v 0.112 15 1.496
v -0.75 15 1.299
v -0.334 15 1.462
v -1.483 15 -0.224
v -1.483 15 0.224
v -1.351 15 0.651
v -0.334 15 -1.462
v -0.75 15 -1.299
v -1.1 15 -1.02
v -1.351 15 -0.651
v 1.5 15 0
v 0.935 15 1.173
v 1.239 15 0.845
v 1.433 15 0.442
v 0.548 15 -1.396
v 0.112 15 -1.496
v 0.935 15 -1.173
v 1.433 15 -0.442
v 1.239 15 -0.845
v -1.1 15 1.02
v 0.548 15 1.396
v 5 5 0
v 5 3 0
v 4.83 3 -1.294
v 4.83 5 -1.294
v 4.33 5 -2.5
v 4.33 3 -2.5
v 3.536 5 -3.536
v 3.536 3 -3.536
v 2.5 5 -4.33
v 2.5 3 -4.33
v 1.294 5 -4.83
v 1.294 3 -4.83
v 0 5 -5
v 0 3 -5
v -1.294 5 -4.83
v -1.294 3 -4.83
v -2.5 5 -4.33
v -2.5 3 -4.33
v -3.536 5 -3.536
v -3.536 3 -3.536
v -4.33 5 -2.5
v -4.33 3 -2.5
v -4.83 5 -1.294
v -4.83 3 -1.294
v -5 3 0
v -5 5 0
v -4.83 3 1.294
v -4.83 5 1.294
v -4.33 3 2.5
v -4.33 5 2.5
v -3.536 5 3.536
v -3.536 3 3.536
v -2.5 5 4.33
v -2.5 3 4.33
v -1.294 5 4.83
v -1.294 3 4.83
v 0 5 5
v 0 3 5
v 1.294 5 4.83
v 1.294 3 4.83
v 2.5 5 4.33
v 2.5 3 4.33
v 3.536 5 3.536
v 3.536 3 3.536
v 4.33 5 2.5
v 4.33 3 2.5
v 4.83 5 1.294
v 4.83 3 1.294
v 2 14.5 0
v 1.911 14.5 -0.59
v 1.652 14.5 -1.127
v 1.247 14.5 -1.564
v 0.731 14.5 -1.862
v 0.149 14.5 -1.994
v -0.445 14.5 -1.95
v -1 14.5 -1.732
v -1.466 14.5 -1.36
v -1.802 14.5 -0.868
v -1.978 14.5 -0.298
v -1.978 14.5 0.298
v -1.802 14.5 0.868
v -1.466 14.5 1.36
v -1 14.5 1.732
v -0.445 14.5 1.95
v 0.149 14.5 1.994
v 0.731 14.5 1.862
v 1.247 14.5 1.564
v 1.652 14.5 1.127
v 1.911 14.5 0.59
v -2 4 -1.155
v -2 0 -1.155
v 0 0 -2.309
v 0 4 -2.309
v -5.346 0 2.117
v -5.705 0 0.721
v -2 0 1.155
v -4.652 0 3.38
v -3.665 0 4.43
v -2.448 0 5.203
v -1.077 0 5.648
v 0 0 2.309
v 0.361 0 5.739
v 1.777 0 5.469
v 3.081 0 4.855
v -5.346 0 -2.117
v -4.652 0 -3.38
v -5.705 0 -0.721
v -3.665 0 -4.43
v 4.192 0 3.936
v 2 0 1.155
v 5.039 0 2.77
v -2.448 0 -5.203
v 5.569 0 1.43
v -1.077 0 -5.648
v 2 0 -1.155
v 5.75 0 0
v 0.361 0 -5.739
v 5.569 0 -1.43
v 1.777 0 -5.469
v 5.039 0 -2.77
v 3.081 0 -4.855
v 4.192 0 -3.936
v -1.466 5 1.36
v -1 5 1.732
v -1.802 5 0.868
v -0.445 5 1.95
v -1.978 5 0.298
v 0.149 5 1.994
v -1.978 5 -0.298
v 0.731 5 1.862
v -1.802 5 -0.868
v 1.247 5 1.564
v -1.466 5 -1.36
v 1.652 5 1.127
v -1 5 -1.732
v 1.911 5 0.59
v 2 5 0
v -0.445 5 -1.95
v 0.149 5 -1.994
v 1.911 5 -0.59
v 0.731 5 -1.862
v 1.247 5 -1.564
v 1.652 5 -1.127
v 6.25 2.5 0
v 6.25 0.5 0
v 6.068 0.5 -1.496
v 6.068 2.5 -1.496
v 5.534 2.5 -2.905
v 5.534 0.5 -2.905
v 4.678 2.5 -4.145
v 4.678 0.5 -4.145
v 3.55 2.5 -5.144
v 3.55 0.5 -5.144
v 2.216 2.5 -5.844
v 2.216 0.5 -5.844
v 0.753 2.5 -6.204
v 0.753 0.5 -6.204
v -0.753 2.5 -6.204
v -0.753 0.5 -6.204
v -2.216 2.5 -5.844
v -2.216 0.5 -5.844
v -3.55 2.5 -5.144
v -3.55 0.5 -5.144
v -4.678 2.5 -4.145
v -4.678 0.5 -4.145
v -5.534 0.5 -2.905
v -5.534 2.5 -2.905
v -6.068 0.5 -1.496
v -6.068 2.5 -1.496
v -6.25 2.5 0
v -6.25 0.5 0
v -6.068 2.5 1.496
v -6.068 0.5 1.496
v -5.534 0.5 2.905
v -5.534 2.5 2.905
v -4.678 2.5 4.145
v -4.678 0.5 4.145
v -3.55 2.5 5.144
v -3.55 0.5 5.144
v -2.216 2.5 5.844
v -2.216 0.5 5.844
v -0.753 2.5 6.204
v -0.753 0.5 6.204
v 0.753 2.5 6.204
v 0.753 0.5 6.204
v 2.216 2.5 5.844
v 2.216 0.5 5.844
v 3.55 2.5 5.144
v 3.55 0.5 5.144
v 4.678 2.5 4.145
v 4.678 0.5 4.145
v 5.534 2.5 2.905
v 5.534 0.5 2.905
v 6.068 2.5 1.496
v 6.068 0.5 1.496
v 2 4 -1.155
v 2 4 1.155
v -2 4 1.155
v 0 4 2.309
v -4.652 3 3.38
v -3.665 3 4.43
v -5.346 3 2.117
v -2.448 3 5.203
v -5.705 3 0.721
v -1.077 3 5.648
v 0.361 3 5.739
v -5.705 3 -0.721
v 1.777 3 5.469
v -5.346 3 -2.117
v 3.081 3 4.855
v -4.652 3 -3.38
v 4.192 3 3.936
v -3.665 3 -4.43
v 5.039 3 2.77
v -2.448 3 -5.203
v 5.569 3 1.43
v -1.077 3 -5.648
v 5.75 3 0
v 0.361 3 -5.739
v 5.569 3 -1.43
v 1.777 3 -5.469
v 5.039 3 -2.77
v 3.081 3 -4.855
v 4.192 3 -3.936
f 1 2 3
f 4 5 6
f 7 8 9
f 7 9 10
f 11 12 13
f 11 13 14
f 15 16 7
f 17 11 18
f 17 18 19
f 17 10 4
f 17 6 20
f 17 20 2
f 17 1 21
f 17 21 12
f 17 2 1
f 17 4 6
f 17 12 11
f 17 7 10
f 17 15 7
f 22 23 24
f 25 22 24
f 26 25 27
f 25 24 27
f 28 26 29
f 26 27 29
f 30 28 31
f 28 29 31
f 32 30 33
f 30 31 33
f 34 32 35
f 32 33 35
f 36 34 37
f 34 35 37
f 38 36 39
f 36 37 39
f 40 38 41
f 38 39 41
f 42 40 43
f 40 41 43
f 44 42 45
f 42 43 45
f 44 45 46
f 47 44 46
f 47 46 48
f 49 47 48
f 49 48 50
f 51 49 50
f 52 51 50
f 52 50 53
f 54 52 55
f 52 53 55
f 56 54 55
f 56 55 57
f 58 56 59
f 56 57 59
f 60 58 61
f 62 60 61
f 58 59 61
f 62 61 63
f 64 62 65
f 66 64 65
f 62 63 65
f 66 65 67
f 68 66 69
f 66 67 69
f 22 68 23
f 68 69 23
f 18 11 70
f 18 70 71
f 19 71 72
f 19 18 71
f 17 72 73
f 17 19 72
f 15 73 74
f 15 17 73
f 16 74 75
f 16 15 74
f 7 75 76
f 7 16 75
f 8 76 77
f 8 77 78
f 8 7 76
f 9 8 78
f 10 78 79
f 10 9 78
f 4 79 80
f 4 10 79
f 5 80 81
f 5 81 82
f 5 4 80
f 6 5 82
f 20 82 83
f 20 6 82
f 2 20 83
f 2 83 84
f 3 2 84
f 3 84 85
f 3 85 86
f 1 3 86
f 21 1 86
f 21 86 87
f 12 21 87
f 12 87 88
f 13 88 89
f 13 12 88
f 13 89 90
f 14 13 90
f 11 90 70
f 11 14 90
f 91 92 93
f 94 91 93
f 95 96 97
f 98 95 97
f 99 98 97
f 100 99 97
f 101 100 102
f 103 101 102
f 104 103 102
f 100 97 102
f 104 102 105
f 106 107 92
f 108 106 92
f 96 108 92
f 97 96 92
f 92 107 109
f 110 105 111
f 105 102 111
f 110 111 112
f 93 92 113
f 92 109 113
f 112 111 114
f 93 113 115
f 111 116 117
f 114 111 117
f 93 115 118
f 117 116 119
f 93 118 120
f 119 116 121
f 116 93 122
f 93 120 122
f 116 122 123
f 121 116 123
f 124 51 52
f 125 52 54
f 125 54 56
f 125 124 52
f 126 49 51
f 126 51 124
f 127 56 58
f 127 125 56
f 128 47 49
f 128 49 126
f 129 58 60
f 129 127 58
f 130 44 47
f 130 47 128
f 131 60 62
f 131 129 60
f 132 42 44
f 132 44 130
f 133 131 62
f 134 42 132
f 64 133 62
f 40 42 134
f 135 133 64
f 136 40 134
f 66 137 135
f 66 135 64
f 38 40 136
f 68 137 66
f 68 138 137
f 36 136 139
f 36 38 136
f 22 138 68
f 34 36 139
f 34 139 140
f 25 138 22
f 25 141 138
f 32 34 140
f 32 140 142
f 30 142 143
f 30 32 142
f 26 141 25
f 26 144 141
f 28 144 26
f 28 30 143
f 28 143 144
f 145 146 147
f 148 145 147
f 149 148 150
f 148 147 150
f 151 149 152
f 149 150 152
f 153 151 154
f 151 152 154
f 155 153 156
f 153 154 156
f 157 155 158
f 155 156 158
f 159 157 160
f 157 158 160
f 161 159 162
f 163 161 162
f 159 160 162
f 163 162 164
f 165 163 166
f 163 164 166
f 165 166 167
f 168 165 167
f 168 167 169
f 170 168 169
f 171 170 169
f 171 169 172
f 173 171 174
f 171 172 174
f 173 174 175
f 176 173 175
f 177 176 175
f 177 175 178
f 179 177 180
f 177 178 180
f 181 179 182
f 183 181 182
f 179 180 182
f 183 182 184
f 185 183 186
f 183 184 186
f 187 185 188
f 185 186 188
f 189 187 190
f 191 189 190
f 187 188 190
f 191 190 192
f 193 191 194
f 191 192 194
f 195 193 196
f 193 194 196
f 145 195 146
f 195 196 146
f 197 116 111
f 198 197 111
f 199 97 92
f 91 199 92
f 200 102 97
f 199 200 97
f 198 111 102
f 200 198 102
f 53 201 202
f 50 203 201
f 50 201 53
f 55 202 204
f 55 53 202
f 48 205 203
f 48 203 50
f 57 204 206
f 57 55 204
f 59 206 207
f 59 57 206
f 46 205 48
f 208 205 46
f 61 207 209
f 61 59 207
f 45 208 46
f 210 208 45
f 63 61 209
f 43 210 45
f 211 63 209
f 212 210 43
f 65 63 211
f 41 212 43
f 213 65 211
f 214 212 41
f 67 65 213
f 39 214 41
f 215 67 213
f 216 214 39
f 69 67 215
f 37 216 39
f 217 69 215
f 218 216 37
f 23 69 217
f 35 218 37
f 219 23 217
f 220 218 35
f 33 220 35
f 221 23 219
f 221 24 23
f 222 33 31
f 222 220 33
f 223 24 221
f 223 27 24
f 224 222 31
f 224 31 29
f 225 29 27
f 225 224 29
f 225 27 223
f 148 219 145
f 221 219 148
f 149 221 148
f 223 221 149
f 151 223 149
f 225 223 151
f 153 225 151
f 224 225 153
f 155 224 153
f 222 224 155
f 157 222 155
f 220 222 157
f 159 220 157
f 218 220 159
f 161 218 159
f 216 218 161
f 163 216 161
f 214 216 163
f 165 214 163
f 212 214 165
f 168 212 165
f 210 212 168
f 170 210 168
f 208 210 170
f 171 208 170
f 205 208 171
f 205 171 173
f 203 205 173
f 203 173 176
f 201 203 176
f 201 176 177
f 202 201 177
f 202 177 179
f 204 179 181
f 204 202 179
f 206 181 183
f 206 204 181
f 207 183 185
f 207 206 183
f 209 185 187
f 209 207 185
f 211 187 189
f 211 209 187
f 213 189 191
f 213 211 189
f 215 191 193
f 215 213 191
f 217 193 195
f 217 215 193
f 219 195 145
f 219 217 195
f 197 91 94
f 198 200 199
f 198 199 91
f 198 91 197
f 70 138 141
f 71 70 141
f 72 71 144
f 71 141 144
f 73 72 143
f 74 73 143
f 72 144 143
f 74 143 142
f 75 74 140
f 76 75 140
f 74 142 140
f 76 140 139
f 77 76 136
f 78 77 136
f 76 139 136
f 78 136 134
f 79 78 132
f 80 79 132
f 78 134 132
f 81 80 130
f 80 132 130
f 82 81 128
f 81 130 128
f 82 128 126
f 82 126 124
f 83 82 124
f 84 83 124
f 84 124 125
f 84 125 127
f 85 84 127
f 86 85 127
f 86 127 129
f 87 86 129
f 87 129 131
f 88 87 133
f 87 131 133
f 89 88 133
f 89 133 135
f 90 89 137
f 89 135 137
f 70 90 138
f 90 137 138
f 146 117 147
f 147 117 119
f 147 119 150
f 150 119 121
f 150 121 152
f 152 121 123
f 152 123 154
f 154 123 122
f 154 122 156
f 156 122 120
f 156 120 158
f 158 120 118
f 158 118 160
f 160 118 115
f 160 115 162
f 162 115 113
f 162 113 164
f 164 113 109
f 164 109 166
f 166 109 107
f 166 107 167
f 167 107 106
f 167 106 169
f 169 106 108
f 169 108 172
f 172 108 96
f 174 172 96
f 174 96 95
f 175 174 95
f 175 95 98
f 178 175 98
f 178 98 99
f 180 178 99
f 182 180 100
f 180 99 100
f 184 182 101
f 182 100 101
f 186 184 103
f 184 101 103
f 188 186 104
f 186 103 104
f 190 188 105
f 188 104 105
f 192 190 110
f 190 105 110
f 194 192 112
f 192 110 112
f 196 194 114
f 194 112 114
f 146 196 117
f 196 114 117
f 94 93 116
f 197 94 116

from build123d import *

# Parameters (mm, degrees)
ESQUISSE1_R      = 6.25
EXTRUSION1_DEPTH = 3
ESQUISSE2_R      = 5
EXTRUSION2_DEPTH = 2
ESQUISSE3_R      = 2
EXTRUSION3_DEPTH = 10
CHANFREIN1_SIZE  = 0.5
CHANFREIN2_SIZE  = 0.5
EXTRUSION4_DEPTH = 4


with BuildPart() as part:
    # Esquisse1 → Extrusion1 (new body)
    with BuildSketch(Plane(origin=(0, 0, 0), x_dir=(1, 0, 0), z_dir=(0, 1, 0))):
        Circle(ESQUISSE1_R)
    extrude(amount=EXTRUSION1_DEPTH)

    # Esquisse2 → Extrusion2 (add)
    with BuildSketch(Plane(origin=(0, 3, 0), x_dir=(1, 0, 0), z_dir=(0, 1, 0))):
        Circle(ESQUISSE2_R)
    extrude(amount=EXTRUSION2_DEPTH)

    # Esquisse3 → Extrusion3 (add)
    with BuildSketch(Plane(origin=(0, 5, 0), x_dir=(1, 0, 0), z_dir=(0, 1, 0))):
        Circle(ESQUISSE3_R)
    extrude(amount=EXTRUSION3_DEPTH)

    # Chanfrein1
    chanfrein1_edges = [part.edges().sort_by_distance(p)[0] for p in [
        (-6.25, 0, 0),
        (-6.25, 3, 0),
    ]]
    chamfer(chanfrein1_edges, length=CHANFREIN1_SIZE)

    # Chanfrein2
    chanfrein2_edges = [part.edges().sort_by_distance(p)[0] for p in [
        (-2, 15, 0),
    ]]
    chamfer(chanfrein2_edges, length=CHANFREIN2_SIZE)

    # Esquisse4 → Extrusion4 (cut)
    with BuildSketch(Plane.XZ):
        Polygon((0, 2.309401077), (-2, 1.154700538), (-2, -1.154700538), (0, -2.309401077), (2, -1.154700538), (2, 1.154700538), align=None)
    extrude(amount=-EXTRUSION4_DEPTH, mode=Mode.SUBTRACT)


solid = part.part
